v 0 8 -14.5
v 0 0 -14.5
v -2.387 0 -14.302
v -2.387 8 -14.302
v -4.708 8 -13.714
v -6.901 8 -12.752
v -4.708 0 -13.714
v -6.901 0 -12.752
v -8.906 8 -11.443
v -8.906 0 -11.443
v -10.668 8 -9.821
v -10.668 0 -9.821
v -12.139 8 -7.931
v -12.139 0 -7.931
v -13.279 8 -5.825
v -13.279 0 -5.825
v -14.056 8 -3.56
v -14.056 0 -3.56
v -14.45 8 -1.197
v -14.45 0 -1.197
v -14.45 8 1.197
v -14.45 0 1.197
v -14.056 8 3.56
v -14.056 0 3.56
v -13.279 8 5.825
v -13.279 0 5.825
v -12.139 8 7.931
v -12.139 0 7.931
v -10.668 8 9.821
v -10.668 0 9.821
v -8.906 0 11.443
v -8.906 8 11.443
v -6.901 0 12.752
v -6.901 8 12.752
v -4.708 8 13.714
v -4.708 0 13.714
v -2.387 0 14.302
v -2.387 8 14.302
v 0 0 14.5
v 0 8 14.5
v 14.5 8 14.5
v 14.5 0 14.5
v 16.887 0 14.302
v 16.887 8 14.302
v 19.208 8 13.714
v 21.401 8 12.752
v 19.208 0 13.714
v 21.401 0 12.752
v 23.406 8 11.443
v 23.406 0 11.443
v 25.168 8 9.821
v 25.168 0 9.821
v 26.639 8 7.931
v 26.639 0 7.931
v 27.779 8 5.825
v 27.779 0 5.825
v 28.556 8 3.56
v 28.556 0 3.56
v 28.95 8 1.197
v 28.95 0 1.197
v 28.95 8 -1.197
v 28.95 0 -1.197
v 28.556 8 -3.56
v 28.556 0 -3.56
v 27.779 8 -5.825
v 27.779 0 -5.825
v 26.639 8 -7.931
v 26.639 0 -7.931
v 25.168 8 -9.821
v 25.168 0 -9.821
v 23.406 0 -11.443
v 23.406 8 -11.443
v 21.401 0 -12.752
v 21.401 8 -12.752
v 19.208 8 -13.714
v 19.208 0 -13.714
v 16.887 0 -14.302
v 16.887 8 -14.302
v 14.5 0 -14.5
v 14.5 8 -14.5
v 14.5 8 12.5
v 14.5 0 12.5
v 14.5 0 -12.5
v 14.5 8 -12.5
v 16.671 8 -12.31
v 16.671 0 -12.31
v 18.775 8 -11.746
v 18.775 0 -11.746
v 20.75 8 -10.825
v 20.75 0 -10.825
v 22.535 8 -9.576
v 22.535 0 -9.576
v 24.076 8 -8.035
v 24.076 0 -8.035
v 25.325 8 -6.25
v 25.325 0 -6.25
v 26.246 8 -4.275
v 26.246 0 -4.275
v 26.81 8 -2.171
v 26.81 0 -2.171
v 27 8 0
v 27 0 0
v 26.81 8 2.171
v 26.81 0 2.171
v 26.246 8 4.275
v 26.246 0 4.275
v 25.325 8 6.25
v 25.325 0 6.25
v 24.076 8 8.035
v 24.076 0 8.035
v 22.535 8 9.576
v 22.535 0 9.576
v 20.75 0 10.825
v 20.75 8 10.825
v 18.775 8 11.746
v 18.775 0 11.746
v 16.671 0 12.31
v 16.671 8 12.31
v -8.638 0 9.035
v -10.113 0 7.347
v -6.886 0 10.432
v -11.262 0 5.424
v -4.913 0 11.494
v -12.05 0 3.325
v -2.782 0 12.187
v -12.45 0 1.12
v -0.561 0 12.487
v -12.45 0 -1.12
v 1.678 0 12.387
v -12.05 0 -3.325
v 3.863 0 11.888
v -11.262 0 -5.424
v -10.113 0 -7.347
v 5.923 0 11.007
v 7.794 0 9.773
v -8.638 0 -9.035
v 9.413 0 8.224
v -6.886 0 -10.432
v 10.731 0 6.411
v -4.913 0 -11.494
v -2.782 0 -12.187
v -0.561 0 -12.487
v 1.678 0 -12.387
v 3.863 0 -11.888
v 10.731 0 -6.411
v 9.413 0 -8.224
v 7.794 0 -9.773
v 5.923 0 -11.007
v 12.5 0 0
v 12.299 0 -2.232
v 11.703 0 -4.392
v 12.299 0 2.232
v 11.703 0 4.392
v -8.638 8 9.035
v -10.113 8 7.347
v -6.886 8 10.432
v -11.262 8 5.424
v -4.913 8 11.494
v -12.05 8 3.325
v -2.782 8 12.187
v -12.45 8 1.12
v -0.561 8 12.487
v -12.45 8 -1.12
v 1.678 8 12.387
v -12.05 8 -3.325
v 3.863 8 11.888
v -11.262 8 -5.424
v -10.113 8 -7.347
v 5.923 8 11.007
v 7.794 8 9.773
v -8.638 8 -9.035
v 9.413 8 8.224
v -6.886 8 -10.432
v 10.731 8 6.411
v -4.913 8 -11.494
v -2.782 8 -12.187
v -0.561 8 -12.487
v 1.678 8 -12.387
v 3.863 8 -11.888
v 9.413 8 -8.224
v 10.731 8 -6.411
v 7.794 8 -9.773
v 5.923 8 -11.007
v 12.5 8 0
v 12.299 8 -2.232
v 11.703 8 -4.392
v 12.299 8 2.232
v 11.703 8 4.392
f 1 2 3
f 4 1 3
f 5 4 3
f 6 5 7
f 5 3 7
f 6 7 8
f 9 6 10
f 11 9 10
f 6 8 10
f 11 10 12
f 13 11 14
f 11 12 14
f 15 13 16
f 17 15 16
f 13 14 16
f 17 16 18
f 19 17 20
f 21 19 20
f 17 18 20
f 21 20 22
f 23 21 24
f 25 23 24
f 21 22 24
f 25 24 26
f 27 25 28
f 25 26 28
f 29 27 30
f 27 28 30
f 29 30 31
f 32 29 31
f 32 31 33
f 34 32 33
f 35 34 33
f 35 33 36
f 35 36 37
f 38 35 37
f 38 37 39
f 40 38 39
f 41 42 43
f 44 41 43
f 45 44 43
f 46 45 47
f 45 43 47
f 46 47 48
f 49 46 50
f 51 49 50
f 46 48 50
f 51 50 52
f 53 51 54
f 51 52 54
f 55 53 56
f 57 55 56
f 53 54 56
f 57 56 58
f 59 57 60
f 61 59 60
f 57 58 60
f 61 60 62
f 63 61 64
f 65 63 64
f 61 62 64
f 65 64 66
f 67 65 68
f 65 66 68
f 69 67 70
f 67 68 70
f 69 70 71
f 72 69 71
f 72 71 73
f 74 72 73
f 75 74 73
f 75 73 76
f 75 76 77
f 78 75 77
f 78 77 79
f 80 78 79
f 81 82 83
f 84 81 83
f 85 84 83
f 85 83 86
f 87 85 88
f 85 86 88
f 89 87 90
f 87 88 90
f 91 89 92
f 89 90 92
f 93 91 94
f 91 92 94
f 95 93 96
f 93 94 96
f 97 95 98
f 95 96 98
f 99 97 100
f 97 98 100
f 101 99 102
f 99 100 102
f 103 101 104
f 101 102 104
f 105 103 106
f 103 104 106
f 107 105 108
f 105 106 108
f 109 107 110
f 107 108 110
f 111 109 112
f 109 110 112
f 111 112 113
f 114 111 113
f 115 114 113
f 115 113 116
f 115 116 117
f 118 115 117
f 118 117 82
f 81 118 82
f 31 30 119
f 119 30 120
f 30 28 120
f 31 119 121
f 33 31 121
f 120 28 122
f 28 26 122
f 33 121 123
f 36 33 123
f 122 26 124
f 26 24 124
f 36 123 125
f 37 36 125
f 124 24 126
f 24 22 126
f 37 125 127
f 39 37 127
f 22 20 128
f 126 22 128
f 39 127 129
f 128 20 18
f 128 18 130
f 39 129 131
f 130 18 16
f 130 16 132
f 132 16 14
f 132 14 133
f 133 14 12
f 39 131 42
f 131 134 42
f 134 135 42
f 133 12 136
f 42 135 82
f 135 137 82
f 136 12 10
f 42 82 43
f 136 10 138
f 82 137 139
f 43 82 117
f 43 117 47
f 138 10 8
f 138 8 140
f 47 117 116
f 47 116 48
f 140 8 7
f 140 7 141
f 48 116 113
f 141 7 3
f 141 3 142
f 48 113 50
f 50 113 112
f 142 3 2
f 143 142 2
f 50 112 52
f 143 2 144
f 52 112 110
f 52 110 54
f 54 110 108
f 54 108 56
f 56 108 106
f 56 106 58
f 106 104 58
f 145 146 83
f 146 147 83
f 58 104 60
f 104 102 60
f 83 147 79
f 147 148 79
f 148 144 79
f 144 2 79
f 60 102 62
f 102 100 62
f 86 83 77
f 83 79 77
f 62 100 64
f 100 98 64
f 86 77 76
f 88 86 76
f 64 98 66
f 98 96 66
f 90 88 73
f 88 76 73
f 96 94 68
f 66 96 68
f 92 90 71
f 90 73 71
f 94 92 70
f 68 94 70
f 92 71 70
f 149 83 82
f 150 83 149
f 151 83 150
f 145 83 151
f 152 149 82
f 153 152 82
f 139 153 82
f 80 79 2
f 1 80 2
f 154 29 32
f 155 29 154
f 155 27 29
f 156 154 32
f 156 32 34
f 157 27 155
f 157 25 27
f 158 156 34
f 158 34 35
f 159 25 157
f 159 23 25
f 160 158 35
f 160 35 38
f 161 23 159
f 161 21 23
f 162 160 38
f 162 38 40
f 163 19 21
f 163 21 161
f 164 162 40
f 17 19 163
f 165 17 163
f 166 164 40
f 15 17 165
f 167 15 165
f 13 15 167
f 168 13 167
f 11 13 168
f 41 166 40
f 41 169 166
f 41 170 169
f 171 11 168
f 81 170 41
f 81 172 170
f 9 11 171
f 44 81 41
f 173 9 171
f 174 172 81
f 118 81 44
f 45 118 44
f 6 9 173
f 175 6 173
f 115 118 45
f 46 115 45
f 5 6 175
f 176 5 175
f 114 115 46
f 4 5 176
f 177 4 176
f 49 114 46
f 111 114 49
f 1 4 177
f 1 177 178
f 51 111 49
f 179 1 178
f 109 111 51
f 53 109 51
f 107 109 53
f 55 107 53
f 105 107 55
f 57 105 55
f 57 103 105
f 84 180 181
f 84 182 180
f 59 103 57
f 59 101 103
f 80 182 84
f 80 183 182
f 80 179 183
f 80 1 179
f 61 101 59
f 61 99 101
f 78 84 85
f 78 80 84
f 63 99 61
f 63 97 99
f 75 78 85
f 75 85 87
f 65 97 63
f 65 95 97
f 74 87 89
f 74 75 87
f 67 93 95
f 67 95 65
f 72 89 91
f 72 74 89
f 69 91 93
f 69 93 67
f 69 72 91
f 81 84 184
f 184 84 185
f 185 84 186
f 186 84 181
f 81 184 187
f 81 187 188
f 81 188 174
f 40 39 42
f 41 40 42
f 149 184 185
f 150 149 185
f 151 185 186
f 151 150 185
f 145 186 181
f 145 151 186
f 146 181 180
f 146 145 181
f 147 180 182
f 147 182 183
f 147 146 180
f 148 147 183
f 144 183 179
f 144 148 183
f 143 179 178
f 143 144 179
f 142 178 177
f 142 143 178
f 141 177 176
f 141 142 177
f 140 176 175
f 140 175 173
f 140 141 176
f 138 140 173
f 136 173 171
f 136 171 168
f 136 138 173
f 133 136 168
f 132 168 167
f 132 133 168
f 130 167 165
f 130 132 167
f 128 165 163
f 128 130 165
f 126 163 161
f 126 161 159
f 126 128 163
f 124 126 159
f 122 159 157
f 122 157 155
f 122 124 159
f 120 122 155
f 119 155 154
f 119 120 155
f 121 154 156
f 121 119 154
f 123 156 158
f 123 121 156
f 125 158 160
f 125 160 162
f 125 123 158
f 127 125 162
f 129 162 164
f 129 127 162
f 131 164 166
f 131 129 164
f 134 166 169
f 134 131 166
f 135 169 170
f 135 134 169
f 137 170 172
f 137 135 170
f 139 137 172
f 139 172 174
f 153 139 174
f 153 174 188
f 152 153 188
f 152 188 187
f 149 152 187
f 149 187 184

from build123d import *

# Parameters (mm, degrees)
SKETCH_1_R      = 12.5
EXTRUDE_1_DEPTH = 8
EXTRUDE_2_DEPTH = 8


with BuildPart() as part:
    # 草图1 → 凸台-拉伸1 (new body)
    with BuildSketch(Plane(origin=(0, 0, 0), x_dir=(1, 0, 0), z_dir=(0, 1, 0))):
        with BuildLine():
            ThreePointArc((0, 14.5), (-14.5, 0), (0, -14.5))
            Line((0, -14.5), (14.5, -14.5))
            Line((14.5, -14.5), (14.5, -12.5))
            Line((14.5, -12.5), (14.5, 12.5))
            Line((14.5, 12.5), (14.5, 14.5))
            Line((14.5, 14.5), (0, 14.5))
        make_face()
        Circle(SKETCH_1_R, mode=Mode.SUBTRACT)
    extrude(amount=EXTRUDE_1_DEPTH)

    # 草图1<3> → 凸台-拉伸2 (add)
    with BuildSketch(Plane(origin=(0, 0, 0), x_dir=(1, 0, 0), z_dir=(0, 1, 0))):
        with BuildLine():
            Line((14.5, -12.5), (14.5, -14.5))
            ThreePointArc((14.5, -14.5), (29, 0), (14.5, 14.5))
            Line((14.5, 14.5), (14.5, 12.5))
            ThreePointArc((14.5, 12.5), (27, 0), (14.5, -12.5))
        make_face()
    extrude(amount=EXTRUDE_2_DEPTH)


solid = part.part
